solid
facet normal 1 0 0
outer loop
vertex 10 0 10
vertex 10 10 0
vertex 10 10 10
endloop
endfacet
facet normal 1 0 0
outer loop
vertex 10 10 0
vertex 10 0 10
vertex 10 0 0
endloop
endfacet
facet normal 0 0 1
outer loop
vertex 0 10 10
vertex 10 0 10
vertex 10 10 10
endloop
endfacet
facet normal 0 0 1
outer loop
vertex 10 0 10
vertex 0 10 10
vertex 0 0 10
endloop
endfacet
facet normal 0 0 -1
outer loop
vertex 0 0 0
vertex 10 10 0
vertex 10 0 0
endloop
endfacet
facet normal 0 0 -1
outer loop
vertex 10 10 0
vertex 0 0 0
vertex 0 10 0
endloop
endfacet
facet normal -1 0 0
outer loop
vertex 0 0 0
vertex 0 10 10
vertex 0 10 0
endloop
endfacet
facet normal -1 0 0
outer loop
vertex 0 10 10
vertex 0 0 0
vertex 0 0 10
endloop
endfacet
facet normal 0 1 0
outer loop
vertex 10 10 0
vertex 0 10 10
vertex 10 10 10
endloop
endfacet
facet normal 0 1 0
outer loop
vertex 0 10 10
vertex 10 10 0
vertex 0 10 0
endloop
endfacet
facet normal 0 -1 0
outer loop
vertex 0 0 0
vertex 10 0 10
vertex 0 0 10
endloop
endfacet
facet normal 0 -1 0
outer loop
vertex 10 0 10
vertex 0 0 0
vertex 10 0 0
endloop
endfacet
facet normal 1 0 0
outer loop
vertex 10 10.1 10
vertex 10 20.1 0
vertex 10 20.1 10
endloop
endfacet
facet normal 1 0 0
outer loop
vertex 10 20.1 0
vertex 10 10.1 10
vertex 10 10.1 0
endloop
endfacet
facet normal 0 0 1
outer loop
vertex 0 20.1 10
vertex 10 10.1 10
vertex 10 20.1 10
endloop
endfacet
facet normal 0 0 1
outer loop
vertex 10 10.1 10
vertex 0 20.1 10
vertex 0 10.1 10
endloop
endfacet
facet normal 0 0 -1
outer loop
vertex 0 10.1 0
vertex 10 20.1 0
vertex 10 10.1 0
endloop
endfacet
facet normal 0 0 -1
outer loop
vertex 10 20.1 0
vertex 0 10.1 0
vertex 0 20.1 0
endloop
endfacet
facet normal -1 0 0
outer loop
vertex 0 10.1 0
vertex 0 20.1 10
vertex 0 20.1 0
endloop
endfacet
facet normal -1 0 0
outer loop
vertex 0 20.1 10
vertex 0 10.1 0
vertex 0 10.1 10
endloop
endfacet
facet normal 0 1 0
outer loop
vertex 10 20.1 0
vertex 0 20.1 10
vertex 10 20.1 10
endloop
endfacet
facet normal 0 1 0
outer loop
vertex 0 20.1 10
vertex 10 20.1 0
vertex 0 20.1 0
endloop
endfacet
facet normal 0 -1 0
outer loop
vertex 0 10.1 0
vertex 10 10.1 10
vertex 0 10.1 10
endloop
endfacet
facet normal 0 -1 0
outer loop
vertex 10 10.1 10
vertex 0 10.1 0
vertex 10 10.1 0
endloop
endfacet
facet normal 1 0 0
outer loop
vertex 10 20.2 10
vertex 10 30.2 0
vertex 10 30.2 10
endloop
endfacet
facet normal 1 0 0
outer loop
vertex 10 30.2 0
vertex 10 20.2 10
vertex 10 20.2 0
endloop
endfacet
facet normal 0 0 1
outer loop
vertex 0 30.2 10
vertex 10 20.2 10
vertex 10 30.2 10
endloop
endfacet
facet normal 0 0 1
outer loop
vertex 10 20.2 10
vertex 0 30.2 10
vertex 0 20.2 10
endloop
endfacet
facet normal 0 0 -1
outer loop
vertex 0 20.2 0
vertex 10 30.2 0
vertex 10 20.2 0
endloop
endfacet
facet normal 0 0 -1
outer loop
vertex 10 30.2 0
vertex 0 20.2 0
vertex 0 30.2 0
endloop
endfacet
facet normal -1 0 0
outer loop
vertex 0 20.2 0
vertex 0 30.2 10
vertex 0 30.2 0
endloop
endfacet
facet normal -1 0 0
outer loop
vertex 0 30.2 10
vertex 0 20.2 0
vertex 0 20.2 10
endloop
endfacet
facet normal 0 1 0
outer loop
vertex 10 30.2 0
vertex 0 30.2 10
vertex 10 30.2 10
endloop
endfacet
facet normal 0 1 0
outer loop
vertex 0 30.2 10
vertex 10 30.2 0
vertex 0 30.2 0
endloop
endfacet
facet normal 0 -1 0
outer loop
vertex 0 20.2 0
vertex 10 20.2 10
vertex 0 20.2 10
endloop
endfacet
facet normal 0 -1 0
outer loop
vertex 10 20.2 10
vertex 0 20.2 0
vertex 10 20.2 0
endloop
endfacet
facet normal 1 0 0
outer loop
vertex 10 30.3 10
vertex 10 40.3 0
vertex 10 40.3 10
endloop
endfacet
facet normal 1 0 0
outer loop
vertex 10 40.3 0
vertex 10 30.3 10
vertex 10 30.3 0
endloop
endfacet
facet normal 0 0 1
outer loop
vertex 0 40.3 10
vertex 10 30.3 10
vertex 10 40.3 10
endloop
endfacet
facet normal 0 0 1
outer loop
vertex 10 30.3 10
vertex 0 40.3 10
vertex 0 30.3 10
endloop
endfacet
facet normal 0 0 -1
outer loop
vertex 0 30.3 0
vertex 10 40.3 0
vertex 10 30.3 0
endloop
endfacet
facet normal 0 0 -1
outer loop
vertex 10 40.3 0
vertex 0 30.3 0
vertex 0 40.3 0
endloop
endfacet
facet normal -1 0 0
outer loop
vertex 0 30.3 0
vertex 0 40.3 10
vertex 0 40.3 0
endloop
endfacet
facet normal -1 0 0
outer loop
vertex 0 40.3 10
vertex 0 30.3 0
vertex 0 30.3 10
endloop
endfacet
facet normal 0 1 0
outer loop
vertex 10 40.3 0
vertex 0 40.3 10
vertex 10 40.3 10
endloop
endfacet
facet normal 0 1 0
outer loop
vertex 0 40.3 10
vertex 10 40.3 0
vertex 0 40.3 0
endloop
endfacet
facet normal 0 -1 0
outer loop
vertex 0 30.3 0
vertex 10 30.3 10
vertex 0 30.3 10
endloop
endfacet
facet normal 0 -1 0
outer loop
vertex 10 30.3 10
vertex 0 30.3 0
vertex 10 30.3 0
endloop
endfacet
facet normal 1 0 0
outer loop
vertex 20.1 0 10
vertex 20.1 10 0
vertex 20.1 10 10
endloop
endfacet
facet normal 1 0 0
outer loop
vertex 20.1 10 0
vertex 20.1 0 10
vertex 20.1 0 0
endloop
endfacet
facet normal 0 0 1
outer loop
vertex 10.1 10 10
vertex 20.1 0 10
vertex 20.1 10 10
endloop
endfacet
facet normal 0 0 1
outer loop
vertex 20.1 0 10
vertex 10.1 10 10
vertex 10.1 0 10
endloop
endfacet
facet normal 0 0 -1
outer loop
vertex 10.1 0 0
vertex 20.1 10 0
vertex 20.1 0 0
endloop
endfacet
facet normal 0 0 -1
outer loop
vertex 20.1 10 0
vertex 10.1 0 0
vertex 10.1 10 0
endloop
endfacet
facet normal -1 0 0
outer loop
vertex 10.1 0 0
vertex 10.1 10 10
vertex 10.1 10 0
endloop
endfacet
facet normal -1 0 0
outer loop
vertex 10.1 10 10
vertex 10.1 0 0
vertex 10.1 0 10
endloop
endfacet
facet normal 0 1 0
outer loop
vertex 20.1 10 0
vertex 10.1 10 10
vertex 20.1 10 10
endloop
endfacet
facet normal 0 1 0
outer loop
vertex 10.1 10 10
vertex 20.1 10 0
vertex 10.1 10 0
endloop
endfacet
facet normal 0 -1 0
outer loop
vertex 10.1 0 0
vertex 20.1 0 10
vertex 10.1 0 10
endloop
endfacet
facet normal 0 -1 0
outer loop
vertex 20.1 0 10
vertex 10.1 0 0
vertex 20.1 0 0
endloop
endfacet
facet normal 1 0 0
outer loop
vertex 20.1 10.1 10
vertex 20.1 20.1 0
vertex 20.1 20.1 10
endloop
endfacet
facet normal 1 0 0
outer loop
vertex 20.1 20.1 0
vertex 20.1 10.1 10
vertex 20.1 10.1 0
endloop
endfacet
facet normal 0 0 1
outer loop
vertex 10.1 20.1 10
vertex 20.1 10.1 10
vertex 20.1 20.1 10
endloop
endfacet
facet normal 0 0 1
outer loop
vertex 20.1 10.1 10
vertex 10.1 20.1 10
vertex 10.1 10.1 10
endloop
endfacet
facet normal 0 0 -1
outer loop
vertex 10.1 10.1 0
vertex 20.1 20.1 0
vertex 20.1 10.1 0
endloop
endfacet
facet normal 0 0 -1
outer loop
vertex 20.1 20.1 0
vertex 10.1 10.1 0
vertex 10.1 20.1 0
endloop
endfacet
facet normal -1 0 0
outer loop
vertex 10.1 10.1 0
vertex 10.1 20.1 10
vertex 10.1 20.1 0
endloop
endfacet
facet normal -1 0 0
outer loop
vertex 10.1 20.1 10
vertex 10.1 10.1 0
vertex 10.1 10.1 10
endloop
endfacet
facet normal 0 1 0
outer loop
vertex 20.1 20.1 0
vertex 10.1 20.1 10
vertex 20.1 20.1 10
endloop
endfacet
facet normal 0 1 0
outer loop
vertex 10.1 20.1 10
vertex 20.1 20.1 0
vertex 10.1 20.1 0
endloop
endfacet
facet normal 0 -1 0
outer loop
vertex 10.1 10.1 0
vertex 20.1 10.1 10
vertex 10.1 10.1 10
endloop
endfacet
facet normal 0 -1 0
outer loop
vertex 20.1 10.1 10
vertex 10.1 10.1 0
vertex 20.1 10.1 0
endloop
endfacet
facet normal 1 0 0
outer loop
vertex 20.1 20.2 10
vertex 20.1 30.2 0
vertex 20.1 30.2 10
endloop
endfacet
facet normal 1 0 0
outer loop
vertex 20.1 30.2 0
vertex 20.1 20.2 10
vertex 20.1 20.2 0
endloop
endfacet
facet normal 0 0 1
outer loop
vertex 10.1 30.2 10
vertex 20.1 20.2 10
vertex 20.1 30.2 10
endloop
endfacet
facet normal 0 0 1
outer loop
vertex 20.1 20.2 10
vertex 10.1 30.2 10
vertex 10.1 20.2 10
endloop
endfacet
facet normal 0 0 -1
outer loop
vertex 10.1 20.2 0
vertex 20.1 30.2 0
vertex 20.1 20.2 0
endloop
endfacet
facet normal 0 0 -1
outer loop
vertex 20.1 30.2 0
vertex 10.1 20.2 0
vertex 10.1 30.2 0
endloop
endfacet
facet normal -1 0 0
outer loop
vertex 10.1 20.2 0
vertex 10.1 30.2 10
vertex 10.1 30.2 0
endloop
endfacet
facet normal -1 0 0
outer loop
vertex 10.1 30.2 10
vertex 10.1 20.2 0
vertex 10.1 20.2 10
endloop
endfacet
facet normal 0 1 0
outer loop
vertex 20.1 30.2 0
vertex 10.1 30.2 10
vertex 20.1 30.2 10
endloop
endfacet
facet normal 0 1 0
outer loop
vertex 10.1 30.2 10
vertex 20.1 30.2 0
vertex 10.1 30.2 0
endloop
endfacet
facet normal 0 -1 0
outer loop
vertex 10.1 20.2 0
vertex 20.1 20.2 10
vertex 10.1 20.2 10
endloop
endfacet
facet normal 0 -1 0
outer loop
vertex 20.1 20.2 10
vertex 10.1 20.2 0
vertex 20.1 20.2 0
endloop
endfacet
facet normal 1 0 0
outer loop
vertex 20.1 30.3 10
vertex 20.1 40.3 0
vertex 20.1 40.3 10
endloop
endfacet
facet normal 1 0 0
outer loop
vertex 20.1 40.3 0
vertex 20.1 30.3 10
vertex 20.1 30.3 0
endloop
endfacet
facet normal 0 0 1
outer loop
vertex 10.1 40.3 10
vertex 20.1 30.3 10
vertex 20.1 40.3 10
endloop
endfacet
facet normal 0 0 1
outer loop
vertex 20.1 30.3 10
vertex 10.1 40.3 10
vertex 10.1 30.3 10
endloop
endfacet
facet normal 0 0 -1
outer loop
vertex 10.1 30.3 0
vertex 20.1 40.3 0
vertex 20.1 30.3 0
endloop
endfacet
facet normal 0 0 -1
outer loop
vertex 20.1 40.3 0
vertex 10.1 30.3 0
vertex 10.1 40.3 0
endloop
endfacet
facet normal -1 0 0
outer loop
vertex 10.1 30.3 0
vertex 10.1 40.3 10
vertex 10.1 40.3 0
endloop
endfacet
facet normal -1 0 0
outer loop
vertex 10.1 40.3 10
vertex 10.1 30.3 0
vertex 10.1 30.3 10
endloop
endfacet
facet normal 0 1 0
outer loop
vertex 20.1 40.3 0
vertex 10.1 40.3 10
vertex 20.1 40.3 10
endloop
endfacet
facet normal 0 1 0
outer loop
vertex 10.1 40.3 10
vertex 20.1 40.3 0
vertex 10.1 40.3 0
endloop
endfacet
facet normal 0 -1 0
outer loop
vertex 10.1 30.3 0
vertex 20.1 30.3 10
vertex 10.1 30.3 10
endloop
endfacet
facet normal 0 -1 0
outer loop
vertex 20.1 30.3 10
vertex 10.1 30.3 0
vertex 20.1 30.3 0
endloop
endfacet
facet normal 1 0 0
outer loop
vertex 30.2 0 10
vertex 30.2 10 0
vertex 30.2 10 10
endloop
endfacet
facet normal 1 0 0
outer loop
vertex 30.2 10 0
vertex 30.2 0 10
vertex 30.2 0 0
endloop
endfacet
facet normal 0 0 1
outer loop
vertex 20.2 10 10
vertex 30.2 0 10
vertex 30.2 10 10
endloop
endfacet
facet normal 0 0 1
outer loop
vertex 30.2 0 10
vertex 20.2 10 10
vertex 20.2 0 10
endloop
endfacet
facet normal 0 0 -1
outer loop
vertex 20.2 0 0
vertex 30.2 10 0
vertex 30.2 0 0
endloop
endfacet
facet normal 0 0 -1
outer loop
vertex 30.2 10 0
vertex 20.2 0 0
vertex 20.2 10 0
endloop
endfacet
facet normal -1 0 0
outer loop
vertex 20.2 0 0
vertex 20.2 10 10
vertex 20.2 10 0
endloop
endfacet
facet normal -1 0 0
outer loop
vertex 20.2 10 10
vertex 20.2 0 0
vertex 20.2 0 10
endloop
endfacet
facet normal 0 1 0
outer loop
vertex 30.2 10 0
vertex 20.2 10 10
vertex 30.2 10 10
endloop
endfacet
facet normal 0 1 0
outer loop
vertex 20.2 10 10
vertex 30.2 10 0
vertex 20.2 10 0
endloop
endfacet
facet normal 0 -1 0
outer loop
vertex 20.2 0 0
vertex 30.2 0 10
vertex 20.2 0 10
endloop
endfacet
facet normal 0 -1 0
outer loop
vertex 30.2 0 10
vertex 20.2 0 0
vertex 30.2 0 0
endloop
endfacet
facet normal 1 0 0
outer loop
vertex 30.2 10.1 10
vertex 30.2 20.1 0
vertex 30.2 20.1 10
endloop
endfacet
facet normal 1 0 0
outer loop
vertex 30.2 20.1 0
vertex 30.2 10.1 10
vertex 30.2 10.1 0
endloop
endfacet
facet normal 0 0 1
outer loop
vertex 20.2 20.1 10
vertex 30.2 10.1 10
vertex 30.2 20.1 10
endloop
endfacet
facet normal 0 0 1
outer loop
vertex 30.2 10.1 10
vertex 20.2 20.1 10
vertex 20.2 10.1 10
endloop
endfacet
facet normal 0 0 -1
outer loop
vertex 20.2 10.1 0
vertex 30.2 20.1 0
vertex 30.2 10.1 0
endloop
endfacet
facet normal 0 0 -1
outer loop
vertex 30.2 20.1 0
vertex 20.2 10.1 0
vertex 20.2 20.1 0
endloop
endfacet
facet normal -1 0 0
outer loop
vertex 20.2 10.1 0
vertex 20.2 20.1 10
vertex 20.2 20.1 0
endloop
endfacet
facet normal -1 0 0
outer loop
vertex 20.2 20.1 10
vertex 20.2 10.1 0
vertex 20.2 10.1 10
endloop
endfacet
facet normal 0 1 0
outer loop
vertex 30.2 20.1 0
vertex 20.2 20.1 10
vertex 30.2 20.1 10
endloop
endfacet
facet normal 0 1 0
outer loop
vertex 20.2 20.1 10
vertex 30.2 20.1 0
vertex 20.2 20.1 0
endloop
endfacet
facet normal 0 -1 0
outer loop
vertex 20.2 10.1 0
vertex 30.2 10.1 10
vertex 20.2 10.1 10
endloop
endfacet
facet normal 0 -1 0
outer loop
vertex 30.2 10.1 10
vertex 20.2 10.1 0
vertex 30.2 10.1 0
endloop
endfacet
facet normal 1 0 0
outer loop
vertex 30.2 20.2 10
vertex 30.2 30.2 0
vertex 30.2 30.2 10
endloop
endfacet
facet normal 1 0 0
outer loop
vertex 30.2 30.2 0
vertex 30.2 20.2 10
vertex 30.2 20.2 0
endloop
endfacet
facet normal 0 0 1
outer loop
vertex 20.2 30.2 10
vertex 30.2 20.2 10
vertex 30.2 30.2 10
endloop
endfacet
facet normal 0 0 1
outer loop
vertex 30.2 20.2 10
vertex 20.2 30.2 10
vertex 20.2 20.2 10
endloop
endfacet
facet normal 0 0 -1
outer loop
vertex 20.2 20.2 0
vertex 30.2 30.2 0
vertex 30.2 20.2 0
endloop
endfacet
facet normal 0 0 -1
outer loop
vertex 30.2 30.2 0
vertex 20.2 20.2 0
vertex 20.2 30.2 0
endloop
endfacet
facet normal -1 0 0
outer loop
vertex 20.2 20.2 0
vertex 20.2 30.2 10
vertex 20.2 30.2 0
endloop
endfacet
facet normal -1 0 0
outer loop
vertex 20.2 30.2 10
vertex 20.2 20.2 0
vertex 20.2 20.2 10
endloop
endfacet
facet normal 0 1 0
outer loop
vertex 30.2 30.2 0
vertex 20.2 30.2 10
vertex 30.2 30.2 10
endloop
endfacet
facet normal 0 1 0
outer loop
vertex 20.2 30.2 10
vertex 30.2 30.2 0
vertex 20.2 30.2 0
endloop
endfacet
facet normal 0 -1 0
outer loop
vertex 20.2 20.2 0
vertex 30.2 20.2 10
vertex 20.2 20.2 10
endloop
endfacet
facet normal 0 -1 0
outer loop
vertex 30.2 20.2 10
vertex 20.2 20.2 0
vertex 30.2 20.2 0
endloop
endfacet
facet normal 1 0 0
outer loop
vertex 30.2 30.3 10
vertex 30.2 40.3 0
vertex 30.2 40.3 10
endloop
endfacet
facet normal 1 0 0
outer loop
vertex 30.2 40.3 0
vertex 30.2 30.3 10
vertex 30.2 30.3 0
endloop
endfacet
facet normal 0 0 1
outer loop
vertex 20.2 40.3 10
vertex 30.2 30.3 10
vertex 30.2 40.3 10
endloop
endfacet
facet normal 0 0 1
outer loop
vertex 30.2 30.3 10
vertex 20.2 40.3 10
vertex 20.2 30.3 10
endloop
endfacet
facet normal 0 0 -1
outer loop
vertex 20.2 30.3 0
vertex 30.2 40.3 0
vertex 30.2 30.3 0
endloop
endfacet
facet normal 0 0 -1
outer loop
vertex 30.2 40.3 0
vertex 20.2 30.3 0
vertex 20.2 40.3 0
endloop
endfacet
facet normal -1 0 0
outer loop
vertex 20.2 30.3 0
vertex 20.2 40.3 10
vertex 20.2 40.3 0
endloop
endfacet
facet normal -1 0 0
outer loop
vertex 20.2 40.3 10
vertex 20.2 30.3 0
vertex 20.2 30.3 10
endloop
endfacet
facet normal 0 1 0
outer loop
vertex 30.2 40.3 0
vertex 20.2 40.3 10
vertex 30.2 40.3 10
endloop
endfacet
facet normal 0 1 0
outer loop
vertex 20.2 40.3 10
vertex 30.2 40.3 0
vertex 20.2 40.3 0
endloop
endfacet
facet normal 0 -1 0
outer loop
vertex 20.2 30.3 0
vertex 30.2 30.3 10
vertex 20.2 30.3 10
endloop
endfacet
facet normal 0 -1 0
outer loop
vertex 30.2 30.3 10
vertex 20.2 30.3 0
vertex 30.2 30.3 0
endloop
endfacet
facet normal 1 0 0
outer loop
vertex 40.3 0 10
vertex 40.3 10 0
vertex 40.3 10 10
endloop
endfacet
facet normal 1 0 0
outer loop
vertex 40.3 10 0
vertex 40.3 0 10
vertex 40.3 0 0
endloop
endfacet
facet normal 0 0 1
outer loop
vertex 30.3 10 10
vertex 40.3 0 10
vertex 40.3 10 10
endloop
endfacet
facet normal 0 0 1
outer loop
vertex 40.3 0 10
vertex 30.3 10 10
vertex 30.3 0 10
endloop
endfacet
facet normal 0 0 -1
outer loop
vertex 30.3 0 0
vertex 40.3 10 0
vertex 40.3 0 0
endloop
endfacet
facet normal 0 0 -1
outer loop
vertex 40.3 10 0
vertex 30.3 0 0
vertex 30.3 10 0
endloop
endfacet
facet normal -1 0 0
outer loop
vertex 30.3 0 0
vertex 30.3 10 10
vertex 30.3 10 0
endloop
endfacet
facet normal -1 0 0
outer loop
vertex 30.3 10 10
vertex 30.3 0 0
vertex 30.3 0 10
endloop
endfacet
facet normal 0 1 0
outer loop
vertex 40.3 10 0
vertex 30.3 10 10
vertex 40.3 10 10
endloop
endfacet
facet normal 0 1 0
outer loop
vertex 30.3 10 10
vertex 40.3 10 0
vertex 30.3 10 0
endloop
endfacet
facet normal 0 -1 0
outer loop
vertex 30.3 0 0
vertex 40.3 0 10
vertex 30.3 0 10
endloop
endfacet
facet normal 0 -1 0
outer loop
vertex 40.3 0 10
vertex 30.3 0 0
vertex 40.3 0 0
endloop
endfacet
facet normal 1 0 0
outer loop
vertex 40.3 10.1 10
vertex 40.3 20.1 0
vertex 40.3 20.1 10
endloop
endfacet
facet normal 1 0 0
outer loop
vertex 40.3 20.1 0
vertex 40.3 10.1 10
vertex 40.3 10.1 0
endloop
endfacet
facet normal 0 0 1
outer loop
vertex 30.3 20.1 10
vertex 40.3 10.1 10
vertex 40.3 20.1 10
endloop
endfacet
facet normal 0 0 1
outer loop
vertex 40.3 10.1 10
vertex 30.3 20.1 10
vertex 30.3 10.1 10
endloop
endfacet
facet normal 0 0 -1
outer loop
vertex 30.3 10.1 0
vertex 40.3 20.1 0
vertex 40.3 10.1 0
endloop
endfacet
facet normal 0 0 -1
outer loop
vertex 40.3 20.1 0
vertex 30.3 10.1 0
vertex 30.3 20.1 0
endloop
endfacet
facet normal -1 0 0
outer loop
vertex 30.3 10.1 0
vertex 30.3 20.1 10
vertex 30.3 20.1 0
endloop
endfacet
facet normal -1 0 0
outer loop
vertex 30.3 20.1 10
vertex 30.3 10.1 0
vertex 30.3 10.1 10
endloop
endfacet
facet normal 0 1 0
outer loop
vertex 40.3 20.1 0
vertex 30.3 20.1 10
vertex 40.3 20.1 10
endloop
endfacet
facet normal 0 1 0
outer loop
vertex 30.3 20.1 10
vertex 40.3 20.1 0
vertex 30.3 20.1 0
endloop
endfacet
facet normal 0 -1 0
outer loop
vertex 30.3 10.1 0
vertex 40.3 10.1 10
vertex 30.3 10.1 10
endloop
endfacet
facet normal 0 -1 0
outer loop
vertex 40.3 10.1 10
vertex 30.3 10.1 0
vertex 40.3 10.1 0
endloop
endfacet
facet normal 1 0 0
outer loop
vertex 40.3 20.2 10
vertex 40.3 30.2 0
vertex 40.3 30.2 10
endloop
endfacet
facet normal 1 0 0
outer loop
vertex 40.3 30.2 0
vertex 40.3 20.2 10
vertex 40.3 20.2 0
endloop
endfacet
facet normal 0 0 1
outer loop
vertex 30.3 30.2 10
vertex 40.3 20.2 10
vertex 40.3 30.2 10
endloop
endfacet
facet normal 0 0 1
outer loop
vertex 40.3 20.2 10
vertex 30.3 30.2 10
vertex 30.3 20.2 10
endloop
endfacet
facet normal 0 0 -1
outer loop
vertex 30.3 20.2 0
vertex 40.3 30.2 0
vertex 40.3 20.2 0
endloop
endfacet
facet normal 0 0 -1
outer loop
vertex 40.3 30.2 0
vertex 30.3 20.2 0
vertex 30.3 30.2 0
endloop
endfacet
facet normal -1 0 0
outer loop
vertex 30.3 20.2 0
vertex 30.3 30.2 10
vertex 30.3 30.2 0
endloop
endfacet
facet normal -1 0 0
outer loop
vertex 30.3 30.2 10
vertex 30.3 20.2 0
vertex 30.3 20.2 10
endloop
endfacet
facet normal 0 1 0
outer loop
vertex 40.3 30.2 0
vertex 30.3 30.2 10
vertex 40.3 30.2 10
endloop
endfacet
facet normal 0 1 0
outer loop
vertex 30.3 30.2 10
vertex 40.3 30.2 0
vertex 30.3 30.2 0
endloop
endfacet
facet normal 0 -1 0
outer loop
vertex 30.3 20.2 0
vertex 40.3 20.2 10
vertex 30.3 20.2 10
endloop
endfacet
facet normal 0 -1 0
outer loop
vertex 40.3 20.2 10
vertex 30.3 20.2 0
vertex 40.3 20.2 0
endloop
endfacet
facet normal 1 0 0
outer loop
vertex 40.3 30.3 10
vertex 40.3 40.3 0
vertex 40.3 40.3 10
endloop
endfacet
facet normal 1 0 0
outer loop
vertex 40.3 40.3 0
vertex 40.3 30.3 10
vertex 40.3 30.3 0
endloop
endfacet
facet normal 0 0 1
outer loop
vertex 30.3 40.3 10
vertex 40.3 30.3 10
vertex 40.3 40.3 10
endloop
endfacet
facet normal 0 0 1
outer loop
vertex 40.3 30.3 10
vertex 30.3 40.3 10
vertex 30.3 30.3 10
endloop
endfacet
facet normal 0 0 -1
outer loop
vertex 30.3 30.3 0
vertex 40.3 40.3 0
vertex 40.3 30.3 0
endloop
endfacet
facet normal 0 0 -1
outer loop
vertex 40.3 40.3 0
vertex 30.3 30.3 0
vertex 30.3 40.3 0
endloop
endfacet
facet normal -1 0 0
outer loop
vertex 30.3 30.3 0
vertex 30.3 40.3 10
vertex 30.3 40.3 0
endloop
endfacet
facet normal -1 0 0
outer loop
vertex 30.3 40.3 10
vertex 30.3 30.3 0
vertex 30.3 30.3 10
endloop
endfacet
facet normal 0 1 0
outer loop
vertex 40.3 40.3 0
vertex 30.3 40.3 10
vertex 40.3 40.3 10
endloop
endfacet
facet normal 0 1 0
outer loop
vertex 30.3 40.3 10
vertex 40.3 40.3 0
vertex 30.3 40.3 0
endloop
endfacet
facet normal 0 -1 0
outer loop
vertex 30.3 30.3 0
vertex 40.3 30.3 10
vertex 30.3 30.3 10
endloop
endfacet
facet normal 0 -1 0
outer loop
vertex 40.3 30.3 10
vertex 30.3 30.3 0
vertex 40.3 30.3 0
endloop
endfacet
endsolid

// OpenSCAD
for(x = [0:3]) {
    for(y = [0:3]) {
        translate([x * 10.1,y * 10.1,0]) {
            cube([10,10,10]);
        }
    }
}
